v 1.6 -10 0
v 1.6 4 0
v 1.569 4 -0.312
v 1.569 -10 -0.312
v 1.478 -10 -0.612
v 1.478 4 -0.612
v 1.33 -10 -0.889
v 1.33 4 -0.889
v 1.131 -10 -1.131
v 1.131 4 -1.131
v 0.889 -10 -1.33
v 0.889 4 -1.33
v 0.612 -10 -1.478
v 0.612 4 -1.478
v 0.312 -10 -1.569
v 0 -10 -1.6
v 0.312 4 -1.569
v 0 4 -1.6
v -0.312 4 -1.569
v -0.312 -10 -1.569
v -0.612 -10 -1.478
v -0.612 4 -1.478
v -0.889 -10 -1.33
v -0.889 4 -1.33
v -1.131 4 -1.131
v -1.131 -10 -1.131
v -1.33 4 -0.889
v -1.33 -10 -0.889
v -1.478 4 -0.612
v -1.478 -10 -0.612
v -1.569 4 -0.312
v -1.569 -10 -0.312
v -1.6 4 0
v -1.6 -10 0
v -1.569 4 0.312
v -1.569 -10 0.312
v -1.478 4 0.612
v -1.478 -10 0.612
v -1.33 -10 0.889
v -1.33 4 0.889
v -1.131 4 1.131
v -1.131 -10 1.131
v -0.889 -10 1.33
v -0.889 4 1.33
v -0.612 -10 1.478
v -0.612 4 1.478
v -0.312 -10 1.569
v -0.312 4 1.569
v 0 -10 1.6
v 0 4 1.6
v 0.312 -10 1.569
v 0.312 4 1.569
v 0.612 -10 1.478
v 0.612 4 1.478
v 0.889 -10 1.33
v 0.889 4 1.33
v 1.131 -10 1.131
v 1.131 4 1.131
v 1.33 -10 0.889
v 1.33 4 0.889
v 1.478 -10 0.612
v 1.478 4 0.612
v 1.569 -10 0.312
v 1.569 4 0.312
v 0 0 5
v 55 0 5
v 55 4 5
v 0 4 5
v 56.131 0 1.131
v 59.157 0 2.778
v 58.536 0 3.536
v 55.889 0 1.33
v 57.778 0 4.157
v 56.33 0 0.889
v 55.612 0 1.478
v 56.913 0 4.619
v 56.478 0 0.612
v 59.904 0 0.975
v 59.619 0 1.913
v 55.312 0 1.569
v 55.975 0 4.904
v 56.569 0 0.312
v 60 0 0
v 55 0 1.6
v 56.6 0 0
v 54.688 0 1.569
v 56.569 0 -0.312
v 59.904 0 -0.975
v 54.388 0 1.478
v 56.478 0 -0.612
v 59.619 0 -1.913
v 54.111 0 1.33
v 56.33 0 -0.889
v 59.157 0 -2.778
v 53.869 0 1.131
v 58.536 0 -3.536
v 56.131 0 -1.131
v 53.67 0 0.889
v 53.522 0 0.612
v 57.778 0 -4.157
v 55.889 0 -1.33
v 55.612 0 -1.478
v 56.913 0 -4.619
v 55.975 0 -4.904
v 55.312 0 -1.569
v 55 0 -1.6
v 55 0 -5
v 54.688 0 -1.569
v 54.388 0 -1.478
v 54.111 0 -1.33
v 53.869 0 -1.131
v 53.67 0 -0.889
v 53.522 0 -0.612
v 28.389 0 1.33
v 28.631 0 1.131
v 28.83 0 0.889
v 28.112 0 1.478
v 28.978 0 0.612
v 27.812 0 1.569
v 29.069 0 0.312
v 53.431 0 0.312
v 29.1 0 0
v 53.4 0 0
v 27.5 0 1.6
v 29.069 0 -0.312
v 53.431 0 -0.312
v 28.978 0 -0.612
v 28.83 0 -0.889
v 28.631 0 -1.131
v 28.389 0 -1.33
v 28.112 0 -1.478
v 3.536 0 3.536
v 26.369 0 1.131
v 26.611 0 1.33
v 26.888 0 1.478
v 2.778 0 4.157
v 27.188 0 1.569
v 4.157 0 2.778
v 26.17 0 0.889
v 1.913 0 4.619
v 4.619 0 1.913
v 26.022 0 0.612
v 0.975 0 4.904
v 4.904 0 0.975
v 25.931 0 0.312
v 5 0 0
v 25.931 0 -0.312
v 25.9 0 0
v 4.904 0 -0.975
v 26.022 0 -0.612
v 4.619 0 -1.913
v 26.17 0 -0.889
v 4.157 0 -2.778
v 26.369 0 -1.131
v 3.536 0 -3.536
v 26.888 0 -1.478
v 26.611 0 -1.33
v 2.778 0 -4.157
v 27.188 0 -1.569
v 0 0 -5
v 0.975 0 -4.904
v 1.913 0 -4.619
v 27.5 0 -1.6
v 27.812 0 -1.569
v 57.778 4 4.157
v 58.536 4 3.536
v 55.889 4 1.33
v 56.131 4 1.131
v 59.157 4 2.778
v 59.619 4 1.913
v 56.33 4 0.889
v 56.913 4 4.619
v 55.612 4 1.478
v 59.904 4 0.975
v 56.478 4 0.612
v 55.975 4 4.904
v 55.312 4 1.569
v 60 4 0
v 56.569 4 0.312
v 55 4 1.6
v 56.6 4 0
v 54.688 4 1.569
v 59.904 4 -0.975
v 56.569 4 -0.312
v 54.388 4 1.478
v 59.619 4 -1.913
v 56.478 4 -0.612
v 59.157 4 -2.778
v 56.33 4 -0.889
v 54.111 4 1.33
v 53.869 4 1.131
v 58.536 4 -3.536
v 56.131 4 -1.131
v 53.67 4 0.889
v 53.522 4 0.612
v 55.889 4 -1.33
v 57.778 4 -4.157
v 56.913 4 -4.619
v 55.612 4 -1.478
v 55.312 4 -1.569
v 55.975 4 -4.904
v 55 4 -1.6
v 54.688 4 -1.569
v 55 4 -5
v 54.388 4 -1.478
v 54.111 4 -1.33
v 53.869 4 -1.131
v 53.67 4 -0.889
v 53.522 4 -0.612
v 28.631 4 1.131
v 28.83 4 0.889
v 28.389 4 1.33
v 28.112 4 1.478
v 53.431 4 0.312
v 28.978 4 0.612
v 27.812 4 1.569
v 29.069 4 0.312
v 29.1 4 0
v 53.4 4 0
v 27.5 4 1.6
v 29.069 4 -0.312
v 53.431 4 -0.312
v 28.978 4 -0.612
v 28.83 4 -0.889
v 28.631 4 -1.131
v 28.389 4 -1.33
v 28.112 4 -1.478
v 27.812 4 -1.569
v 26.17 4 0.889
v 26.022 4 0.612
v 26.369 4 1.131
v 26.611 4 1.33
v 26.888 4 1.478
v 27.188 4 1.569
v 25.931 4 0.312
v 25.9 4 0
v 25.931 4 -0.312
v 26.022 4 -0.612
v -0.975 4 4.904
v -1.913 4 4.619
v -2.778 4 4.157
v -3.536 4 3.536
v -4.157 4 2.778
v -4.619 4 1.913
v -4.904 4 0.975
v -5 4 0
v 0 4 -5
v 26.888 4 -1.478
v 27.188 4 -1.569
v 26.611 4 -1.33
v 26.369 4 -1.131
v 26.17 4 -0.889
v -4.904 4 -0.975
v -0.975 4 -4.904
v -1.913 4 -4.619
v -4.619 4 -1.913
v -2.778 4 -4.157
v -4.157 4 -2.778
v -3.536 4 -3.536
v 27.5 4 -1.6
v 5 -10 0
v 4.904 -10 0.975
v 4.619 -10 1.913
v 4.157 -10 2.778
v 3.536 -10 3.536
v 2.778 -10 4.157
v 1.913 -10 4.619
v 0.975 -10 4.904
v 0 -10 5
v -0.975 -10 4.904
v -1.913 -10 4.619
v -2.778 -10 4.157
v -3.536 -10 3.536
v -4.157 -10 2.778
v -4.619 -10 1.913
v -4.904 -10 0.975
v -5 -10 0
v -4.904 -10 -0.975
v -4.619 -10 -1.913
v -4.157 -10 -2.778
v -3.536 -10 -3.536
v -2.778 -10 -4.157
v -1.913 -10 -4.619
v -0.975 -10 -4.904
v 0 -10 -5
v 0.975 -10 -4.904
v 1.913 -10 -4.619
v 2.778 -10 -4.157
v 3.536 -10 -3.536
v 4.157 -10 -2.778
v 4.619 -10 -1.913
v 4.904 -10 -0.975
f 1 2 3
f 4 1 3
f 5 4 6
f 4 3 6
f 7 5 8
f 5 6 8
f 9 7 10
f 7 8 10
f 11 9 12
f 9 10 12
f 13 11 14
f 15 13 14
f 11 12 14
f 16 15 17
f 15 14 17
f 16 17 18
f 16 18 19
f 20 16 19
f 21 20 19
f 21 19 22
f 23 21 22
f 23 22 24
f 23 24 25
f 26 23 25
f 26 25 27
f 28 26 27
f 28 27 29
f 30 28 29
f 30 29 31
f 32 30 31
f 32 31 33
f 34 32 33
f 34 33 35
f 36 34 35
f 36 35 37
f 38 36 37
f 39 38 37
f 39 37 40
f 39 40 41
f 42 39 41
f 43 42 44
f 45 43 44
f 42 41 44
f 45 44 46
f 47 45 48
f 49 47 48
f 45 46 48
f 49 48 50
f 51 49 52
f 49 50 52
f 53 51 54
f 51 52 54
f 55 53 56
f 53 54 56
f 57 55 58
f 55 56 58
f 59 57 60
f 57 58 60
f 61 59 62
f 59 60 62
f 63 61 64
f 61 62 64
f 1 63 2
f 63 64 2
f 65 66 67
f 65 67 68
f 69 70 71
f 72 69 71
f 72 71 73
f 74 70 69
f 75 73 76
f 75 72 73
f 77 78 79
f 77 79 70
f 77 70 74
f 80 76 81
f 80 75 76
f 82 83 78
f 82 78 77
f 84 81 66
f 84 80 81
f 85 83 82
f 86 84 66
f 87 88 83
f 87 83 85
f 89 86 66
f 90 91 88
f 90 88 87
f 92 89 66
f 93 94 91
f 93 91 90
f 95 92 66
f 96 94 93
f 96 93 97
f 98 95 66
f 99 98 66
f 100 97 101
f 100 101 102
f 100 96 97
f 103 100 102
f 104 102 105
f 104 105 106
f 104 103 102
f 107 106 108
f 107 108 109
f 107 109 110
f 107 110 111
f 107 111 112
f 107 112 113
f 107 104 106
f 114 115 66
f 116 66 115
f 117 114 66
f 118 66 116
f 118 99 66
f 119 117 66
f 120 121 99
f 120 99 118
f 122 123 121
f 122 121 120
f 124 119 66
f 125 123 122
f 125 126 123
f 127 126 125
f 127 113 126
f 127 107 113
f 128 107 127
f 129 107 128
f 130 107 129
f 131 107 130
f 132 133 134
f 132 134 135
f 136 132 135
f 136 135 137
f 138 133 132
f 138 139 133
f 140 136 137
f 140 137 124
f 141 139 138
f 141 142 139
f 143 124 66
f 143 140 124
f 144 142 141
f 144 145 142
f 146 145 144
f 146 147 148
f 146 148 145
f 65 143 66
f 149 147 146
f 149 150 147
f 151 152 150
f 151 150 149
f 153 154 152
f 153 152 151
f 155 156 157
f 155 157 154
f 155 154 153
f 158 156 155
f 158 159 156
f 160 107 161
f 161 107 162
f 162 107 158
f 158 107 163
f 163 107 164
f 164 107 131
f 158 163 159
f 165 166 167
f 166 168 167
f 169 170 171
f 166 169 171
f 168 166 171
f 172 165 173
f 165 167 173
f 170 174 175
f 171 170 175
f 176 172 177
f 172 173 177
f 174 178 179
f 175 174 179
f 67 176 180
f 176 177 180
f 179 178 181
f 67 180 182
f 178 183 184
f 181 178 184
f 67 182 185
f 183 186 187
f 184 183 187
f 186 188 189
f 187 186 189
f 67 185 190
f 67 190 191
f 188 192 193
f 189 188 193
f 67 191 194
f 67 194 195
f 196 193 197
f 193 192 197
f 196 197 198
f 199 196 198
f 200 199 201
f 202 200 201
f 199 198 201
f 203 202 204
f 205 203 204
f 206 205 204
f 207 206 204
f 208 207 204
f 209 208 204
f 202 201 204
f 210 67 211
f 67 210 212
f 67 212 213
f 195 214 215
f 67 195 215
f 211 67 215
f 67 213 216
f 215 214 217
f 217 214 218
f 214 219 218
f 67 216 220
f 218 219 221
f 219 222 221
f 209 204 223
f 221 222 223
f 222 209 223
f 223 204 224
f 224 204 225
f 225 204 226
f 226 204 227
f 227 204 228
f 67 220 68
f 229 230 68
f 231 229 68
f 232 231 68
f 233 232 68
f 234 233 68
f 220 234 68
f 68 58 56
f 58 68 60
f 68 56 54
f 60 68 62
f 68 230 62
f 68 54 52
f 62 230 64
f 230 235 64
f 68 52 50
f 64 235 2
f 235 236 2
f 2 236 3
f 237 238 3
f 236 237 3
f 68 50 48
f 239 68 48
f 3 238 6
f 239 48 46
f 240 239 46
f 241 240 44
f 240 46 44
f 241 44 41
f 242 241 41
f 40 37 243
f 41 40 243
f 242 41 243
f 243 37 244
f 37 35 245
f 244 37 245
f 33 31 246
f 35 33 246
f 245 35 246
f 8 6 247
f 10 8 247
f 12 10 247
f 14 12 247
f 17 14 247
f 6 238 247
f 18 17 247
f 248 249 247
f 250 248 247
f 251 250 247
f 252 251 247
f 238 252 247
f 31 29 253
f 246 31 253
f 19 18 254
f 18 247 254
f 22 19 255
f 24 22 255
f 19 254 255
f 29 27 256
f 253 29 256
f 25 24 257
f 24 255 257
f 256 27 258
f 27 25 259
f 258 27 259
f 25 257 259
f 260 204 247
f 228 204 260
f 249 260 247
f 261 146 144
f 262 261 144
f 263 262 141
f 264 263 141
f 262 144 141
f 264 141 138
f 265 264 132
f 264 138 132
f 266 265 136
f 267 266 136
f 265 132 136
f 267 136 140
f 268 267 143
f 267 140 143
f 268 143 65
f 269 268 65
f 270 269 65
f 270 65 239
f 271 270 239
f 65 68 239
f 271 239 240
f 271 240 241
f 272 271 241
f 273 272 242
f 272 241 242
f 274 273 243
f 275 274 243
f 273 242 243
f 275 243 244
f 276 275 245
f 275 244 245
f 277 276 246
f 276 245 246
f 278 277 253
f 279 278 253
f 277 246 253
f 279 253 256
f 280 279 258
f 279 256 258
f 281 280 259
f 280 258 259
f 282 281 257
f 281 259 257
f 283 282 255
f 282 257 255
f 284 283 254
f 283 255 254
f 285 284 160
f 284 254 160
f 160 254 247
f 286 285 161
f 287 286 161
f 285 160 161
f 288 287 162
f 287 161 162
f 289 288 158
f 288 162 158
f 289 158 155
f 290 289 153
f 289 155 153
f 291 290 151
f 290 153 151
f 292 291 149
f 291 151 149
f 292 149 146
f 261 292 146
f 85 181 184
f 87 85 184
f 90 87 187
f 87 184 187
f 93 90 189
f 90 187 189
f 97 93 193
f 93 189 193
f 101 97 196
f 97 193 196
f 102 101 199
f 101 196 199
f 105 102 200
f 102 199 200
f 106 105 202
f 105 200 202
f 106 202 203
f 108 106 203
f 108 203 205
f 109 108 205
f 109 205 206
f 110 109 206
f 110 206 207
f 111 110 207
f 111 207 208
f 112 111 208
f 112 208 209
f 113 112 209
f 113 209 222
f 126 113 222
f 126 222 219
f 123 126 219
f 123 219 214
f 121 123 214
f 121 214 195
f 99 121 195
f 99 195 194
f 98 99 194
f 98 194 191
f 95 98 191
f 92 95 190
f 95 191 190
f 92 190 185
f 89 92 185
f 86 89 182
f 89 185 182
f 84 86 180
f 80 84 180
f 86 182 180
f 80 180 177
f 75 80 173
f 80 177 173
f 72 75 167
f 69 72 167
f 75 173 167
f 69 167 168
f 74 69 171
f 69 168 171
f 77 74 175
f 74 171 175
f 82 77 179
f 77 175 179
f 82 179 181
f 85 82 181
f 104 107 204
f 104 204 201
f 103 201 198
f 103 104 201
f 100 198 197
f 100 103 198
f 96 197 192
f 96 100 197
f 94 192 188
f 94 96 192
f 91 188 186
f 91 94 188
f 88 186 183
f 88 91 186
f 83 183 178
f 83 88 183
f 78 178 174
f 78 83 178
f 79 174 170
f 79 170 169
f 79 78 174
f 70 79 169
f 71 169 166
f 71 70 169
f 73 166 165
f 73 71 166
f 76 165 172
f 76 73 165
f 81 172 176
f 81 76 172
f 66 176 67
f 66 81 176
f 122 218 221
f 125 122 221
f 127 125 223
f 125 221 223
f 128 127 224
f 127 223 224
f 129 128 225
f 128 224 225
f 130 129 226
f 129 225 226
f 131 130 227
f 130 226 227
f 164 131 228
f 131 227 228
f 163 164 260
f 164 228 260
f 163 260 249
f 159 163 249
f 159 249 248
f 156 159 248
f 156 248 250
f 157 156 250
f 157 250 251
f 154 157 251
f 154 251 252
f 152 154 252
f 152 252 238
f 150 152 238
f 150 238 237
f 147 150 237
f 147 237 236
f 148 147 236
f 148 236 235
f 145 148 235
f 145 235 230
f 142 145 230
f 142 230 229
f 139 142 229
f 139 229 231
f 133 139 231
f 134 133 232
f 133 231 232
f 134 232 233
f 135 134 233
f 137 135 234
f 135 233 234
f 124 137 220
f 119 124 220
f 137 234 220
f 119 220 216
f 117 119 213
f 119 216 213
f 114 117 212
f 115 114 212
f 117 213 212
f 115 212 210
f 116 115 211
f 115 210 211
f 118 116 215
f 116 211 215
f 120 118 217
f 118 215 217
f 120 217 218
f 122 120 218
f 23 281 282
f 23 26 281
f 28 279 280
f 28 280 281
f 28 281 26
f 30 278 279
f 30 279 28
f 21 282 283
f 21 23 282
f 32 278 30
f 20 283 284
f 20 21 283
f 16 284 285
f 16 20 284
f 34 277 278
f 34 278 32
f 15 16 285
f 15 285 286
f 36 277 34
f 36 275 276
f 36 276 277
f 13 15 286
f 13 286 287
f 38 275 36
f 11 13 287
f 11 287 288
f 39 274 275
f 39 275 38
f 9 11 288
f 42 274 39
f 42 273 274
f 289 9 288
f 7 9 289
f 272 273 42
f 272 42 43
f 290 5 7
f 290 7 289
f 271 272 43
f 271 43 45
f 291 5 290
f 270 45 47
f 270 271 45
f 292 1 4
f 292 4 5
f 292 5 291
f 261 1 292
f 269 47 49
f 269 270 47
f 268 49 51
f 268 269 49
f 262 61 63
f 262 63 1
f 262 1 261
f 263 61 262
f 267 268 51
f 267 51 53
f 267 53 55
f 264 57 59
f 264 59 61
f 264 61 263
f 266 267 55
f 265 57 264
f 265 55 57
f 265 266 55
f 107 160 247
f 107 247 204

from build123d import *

# Parameters (mm, degrees)
BOSS_EXTRUDE1_DEPTH = 4
SKETCH3_R           = 5
BOSS_EXTRUDE2_DEPTH = 10
SKETCH2_R           = 1.6
CUT_EXTRUDE1_DEPTH  = 15


with BuildPart() as part:
    # Sketch1 → Boss-Extrude1 (new body)
    with BuildSketch(Plane(origin=(0, 0, 0), x_dir=(1, 0, 0), z_dir=(0, 1, 0))):
        with BuildLine():
            Line((0, 5), (55, 5))
            ThreePointArc((55, 5), (60, 0), (55, -5))
            Line((55, -5), (0, -5))
            ThreePointArc((0, -5), (-5, 0), (0, 5))
        make_face()
    extrude(amount=BOSS_EXTRUDE1_DEPTH)

    # Sketch3 → Boss-Extrude2 (add)
    with BuildSketch(Plane.XZ):
        Circle(SKETCH3_R)
    extrude(amount=BOSS_EXTRUDE2_DEPTH)

    # Sketch2 → Cut-Extrude1 (cut, through all)
    with BuildSketch(Plane(origin=(0, 4, 0), x_dir=(1, 0, 0), z_dir=(0, 1, 0))):
        Circle(SKETCH2_R)
        with Locations((27.5, 0)):
            Circle(SKETCH2_R)
        with Locations((55, 0)):
            Circle(SKETCH2_R)
    extrude(amount=-CUT_EXTRUDE1_DEPTH, mode=Mode.SUBTRACT)


solid = part.part
